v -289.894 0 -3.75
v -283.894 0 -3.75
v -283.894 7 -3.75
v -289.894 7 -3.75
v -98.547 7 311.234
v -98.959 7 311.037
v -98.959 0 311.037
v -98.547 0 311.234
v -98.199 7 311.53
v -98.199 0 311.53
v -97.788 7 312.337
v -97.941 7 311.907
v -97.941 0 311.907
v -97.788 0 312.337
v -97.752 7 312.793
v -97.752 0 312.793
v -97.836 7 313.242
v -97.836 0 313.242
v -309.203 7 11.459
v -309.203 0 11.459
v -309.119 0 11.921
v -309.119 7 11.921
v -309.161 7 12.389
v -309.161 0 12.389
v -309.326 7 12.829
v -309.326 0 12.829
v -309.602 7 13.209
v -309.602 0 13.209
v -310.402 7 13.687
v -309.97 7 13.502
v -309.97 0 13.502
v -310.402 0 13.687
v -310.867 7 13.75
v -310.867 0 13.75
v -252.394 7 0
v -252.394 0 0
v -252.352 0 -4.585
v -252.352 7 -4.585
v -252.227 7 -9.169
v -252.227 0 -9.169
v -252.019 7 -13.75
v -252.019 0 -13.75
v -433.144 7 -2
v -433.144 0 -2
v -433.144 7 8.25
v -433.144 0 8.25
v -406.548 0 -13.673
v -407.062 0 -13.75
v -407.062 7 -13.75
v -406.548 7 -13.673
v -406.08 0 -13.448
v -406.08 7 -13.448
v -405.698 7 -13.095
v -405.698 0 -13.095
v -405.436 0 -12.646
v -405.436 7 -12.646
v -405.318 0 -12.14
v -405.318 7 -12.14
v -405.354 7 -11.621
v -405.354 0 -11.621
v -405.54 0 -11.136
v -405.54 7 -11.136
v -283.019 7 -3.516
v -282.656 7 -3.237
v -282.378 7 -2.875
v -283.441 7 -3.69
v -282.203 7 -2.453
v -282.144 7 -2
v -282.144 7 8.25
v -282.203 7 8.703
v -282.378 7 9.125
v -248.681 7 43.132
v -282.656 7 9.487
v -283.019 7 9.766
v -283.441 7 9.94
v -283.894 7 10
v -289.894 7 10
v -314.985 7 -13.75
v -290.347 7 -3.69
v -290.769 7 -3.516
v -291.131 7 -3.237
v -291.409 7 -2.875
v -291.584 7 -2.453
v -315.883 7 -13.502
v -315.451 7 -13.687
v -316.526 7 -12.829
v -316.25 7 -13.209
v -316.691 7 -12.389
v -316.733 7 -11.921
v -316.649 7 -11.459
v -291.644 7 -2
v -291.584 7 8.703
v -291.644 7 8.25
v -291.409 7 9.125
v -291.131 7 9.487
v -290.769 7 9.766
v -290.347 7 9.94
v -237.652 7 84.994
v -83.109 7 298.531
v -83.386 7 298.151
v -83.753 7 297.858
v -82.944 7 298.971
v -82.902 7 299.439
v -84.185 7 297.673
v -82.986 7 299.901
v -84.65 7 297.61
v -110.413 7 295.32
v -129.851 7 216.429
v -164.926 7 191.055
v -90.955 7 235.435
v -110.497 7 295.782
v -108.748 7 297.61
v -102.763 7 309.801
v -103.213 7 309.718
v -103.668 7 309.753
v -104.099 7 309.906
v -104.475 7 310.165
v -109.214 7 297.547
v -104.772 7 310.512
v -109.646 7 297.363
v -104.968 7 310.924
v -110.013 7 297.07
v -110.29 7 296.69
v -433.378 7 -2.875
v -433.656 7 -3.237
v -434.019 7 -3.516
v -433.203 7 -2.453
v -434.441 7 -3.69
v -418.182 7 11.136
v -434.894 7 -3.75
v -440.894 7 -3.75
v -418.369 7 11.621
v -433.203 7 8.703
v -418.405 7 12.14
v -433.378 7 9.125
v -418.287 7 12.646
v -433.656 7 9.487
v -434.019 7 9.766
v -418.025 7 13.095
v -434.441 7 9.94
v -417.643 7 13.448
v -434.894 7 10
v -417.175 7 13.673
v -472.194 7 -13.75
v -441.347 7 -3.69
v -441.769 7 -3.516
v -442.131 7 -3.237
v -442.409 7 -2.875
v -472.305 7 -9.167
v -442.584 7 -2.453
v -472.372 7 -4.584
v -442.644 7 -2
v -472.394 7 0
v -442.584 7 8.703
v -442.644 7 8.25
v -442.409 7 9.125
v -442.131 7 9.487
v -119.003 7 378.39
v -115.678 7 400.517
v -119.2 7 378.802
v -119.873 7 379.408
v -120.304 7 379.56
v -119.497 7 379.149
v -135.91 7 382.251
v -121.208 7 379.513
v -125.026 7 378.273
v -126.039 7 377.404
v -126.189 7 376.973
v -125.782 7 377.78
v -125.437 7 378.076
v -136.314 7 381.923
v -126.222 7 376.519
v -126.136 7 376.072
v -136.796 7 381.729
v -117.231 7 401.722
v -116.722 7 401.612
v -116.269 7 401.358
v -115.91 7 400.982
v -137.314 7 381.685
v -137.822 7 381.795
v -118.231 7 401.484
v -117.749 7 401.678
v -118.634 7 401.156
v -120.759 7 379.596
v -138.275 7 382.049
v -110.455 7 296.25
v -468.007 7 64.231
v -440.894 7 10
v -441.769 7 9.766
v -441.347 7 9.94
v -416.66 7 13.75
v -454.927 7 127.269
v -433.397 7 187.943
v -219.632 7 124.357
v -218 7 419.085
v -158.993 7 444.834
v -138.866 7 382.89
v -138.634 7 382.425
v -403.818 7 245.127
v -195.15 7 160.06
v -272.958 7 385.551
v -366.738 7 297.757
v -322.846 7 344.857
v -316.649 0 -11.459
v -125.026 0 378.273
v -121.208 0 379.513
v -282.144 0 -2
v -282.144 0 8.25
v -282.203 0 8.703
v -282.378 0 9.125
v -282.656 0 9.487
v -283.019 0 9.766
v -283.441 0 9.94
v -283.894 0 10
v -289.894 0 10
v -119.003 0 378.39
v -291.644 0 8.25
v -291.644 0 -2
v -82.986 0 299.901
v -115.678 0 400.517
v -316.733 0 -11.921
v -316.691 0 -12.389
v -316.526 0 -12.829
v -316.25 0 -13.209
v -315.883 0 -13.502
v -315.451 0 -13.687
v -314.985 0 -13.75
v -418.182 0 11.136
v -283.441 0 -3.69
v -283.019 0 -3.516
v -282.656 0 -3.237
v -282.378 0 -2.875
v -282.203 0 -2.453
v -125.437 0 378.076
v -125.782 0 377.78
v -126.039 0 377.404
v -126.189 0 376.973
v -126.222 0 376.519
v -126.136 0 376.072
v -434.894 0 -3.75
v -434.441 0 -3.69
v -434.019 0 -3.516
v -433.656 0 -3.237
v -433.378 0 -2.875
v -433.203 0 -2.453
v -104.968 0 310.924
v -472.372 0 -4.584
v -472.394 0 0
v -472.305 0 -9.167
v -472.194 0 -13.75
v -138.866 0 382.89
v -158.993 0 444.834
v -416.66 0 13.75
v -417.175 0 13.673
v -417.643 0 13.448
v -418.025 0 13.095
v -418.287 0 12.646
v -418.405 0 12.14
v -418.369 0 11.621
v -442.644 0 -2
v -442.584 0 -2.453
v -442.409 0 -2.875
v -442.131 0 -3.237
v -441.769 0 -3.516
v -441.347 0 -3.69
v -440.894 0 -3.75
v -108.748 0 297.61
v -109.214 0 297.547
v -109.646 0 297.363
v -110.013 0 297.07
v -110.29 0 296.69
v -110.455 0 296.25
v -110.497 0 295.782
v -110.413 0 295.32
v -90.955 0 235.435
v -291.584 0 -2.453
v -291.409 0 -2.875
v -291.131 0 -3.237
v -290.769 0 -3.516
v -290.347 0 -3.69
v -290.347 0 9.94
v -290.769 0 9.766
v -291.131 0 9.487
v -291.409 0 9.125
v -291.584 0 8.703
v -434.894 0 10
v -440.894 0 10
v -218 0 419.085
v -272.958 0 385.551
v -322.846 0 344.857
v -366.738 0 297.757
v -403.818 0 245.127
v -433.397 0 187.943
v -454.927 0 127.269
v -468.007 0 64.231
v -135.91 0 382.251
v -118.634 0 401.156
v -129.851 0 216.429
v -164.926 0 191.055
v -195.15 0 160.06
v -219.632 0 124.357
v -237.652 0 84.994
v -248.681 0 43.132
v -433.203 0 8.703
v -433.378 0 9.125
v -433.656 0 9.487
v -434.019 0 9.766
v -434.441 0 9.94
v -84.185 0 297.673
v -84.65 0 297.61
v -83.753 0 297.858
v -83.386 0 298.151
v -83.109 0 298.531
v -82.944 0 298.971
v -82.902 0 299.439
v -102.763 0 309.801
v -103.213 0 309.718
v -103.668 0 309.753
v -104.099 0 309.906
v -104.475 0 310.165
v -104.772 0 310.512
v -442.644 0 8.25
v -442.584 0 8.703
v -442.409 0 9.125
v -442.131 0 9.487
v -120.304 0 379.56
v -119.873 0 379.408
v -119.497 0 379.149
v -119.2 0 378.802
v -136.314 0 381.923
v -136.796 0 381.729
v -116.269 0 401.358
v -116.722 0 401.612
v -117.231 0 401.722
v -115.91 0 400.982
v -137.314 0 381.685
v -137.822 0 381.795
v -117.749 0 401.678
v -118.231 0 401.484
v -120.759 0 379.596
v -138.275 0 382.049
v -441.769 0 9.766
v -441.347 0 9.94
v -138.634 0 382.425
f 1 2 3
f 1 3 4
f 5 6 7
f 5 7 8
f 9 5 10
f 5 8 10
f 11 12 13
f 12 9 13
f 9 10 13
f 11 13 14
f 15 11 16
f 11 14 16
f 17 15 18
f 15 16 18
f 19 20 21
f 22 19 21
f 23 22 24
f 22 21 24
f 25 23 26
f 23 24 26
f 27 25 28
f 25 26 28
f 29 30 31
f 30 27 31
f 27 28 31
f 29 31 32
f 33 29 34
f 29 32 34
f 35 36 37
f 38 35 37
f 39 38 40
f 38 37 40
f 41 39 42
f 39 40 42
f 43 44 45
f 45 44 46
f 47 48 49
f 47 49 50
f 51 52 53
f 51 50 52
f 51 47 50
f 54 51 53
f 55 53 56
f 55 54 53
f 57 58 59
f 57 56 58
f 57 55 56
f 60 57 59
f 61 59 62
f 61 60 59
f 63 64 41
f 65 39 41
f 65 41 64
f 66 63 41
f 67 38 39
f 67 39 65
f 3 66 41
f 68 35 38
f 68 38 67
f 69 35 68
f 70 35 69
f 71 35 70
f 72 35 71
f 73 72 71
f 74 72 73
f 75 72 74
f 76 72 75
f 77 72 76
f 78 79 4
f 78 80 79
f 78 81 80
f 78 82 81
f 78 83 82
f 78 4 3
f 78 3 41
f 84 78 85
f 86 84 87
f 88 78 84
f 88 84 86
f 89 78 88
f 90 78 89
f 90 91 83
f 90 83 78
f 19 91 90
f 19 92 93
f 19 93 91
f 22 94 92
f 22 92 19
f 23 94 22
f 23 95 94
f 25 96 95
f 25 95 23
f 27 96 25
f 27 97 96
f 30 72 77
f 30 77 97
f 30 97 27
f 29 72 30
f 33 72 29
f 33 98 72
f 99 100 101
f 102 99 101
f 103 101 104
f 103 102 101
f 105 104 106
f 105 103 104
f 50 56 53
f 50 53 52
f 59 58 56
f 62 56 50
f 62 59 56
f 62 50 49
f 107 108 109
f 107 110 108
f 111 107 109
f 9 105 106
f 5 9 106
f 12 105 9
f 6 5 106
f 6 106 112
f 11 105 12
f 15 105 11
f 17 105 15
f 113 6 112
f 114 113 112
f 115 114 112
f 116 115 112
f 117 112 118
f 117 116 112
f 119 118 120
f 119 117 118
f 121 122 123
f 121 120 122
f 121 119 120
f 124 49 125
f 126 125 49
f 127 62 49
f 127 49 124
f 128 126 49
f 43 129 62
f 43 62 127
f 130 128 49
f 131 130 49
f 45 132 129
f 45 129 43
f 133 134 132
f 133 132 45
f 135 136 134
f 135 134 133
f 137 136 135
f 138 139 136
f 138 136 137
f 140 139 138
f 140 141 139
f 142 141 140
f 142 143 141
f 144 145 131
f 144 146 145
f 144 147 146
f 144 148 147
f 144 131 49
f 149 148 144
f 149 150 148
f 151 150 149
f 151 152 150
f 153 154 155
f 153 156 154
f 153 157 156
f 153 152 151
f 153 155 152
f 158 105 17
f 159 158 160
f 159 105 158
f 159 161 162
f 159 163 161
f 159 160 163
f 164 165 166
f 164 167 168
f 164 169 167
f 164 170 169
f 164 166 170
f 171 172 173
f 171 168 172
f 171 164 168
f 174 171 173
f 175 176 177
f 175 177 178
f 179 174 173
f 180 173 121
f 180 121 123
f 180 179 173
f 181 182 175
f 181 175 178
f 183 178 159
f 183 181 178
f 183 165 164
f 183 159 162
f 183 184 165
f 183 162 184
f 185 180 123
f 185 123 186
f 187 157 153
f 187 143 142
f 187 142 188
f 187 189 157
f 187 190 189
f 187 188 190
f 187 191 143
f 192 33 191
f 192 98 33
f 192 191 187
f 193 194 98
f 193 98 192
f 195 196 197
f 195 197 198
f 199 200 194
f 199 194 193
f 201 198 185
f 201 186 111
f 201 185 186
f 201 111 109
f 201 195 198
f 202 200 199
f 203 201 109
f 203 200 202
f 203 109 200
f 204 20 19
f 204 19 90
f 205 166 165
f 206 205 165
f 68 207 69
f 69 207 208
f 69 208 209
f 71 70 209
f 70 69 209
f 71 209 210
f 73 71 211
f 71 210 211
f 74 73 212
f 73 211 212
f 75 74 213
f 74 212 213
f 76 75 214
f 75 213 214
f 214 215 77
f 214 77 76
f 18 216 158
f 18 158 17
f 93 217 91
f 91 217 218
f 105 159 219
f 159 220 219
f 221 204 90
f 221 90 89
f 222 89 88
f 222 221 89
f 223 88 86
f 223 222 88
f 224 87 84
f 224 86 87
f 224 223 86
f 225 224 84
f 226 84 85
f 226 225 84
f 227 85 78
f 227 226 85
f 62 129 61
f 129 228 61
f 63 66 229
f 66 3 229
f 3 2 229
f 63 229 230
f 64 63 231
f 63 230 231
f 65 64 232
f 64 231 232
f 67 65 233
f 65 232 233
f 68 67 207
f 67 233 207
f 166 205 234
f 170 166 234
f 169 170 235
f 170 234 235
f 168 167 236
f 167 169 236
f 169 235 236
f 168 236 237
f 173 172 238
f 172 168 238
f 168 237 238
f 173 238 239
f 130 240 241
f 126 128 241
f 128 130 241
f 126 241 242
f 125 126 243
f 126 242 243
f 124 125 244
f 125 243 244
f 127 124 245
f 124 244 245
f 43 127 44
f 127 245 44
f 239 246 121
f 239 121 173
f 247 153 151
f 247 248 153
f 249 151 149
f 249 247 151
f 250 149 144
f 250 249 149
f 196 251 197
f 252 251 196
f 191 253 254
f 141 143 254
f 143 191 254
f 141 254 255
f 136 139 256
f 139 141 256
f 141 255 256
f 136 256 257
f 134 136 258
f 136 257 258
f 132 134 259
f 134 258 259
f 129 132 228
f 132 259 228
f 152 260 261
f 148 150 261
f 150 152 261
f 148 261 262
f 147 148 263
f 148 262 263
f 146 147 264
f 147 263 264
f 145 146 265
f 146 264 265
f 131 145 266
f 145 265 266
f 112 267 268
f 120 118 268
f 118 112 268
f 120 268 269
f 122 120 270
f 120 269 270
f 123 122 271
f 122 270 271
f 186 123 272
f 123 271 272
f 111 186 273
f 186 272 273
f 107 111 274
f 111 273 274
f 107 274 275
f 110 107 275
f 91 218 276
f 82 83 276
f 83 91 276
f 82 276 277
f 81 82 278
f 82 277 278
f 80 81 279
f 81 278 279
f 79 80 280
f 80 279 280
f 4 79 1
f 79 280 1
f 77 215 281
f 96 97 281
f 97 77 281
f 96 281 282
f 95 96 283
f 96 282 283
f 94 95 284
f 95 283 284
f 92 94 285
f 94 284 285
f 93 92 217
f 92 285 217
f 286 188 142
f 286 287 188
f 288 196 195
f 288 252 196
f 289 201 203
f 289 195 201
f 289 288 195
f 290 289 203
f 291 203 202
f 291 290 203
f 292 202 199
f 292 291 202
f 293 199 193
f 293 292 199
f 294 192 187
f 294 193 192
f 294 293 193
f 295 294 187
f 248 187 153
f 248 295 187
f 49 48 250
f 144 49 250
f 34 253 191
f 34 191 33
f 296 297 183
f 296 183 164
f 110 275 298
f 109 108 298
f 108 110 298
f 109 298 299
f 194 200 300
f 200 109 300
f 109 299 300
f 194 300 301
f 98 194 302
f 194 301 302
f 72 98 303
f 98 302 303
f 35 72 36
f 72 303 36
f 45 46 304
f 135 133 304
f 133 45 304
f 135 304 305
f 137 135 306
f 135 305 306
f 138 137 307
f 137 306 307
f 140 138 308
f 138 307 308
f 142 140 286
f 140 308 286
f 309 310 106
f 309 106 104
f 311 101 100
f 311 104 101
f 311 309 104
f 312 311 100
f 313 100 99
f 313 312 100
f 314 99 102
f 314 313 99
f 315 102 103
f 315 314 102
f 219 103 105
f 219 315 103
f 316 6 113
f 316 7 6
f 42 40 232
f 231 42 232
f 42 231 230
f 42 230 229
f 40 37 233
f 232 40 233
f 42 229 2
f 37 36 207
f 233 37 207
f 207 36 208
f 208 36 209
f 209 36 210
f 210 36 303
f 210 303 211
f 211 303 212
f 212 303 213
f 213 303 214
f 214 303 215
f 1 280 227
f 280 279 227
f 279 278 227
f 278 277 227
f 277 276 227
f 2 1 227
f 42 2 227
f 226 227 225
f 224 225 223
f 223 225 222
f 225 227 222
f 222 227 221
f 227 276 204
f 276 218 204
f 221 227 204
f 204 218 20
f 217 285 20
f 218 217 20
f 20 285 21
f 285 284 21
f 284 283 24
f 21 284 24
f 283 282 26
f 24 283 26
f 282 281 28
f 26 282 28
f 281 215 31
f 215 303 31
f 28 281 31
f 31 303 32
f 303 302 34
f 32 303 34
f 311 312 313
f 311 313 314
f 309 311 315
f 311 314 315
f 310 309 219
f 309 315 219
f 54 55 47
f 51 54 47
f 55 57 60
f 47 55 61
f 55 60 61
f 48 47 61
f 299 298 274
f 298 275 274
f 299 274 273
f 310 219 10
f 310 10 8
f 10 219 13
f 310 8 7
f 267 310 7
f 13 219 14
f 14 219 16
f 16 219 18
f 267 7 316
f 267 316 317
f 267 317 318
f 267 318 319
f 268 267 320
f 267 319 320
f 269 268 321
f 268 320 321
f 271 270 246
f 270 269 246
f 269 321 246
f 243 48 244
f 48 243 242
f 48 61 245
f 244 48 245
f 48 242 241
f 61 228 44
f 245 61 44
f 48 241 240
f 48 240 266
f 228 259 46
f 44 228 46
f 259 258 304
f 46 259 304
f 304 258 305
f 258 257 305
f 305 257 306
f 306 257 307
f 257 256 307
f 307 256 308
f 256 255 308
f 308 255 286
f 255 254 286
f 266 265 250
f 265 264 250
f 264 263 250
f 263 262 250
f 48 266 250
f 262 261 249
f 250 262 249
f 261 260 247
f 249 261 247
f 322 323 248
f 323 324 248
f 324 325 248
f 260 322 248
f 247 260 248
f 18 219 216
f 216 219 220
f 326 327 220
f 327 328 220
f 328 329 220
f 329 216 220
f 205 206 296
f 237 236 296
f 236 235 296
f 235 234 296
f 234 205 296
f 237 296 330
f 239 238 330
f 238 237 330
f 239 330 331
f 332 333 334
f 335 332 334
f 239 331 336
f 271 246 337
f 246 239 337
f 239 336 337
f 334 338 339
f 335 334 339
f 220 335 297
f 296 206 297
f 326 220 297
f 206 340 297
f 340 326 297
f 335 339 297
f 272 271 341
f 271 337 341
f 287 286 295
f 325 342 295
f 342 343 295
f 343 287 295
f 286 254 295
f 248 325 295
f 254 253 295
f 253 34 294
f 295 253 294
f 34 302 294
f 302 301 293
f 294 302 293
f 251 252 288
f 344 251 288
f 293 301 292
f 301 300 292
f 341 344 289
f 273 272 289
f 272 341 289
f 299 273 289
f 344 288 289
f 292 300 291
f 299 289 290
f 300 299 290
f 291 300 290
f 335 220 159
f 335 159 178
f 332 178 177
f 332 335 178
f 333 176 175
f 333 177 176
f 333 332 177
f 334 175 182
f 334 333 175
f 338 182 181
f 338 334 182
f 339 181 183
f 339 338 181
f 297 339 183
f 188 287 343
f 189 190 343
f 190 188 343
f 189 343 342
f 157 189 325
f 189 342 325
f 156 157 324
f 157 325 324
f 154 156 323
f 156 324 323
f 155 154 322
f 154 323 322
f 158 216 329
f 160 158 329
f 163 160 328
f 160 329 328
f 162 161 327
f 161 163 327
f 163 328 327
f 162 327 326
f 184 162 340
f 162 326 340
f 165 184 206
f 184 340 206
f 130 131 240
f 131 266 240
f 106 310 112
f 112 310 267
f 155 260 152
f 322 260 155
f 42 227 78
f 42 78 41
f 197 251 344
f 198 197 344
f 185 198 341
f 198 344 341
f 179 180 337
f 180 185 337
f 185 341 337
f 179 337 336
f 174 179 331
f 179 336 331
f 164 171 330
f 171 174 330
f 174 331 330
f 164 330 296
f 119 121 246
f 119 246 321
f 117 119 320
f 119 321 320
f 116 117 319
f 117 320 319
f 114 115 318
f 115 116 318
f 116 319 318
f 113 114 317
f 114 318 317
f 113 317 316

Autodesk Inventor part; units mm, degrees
ref_plane "YZ Plane" through (0, 0, 0) normal (1, 0, 0) x (0, 1, 0)
ref_plane "XZ Plane" through (0, 0, 0) normal (0, 1, 0) x (-1, 0, 0)
ref_plane "XY Plane" through (0, 0, 0) normal (0, 0, 1) x (1, 0, 0)
sketch "Sketch1" plane through (0, 0, 0) normal (0, 1, 0) x (-1, 0, 0)
  line L0 (0, 0) -> (618.9442, 0)
  line L1 (0, 0) -> (191.2643, 588.6509)
  line L2 (0, 0) -> (-500.7364, 363.8063)
  line L3 (0, 0) -> (-500.7364, -363.8063)
  line L4 (0, 0) -> (191.2643, -588.6509)
  line L5 (396.6438, 3.75) -> (328.1438, 3.75)
  line L6 (328.1438, -3.75) -> (396.6438, -3.75)
  arc A0 (472.3938, 0) -> (145.9777, 449.2732) centre (0, 0) ccw
  arc A1 (77.994, -240.0408) -> (252.3938, 0) centre (0, 0) ccw
  line L7 (289.8938, 3.75) -> (283.8938, 3.75)
  line L8 (283.8938, -3.75) -> (289.8938, -3.75)
  arc A2 (328.1438, 3.75) -> (326.3938, 2) centre (328.1438, 2) ccw
  arc A3 (326.3938, -2) -> (328.1438, -3.75) centre (328.1438, -2) ccw
  line L9 (326.3938, 2) -> (326.3938, -2)
  arc A4 (398.3938, 2) -> (396.6438, 3.75) centre (396.6438, 2) ccw
  arc A5 (396.6438, -3.75) -> (398.3938, -2.0136) centre (396.6573, -2.0136) ccw
  line L10 (398.3938, -2.0136) -> (398.3938, 2)
  line L11 (362.3938, -3.75) -> (362.3938, 32.9806)
  arc A6 (283.8938, 3.75) -> (282.1438, 2) centre (283.8938, 2) ccw
  arc A7 (282.1438, -2) -> (283.8938, -3.75) centre (283.8938, -2) ccw
  arc A8 (289.8938, -3.75) -> (291.6438, -2) centre (289.8938, -2) ccw
  arc A9 (291.6438, 2) -> (289.8938, 3.75) centre (289.8938, 2) ccw
  line L12 (291.6438, 2) -> (291.6438, -2)
  line L13 (282.1438, -2) -> (282.1438, 2)
  line L14 (434.8938, 3.75) -> (440.8938, 3.75)
  line L15 (440.8938, -3.75) -> (434.8938, -3.75)
  arc A10 (442.6438, 2) -> (440.8938, 3.75) centre (440.8938, 2) ccw
  arc A11 (440.8938, -3.75) -> (442.6438, -2) centre (440.8938, -2) ccw
  arc A12 (433.1438, -2) -> (434.8938, -3.75) centre (434.8938, -2) ccw
  arc A13 (434.8938, 3.75) -> (433.1438, 2) centre (434.8938, 2) ccw
  line L16 (433.1438, 2) -> (433.1438, -2)
  line L17 (442.6438, -2) -> (442.6438, 2)
  line L18 (131.9467, 412.5623) -> (135.7509, 411.3262)
  arc A14 (130.8231, 414.7674) -> (131.9467, 412.5623) centre (132.4875, 414.2266) ccw
  arc A15 (135.7509, 411.3262) -> (137.956, 412.4498) centre (136.2917, 412.9905) ccw
  line L19 (139.8101, 418.1561) -> (137.956, 412.4498)
  line L20 (130.8231, 414.7674) -> (132.6772, 420.4737)
  arc A16 (134.8823, 421.5973) -> (132.6772, 420.4737) centre (134.3416, 419.9329) ccw
  line L21 (138.6866, 420.3612) -> (134.8823, 421.5973)
  arc A17 (139.8101, 418.1561) -> (138.6866, 420.3612) centre (138.1458, 418.6969) ccw
  line L22 (125.0255, 378.2728) -> (121.2083, 379.513)
  arc A18 (121.2083, 379.513) -> (119.0032, 378.3895) centre (120.6676, 377.8487) ccw
  arc A19 (126.1361, 376.0718) -> (125.0255, 378.2728) centre (124.4888, 376.6213) ccw
  line L23 (119.0032, 378.3895) -> (97.8355, 313.2421)
  line L24 (98.9591, 311.037) -> (102.7633, 309.8009)
  arc A20 (97.8355, 313.2421) -> (98.9591, 311.037) centre (99.4999, 312.7013) ccw
  arc A21 (102.7633, 309.8009) -> (104.9685, 310.9245) centre (103.3041, 311.4652) ccw
  line L25 (104.9685, 310.9245) -> (126.1361, 376.0718)
  line L26 (88.2208, 277.9878) -> (92.025, 276.7517)
  arc A22 (93.1486, 274.5466) -> (92.025, 276.7517) centre (91.4842, 275.0873) ccw
  line L27 (91.2945, 268.8402) -> (93.1486, 274.5466)
  arc A23 (88.2208, 277.9878) -> (86.0156, 276.8642) centre (87.68, 276.3234) ccw
  line L28 (86.0156, 276.8642) -> (84.1615, 271.1578)
  arc A24 (84.1615, 271.1578) -> (85.2851, 268.9527) centre (85.8259, 270.6171) ccw
  arc A25 (89.0893, 267.7166) -> (91.2945, 268.8402) centre (89.6301, 269.381) ccw
  line L29 (89.0893, 267.7166) -> (85.2851, 268.9527)
  line L30 (-351.5963, 252.9775) -> (-349.2451, 256.2136)
  arc A26 (-354.0407, 252.5903) -> (-351.5963, 252.9775) centre (-353.012, 254.0061) ccw
  arc A27 (-349.2451, 256.2136) -> (-349.6323, 258.658) centre (-350.6609, 257.2422) ccw
  line L31 (-354.4864, 262.1847) -> (-349.6323, 258.658)
  line L32 (-354.0407, 252.5903) -> (-358.8948, 256.1171)
  arc A28 (-359.2819, 258.5615) -> (-358.8948, 256.1171) centre (-357.8661, 257.5328) ccw
  line L33 (-356.9308, 261.7975) -> (-359.2819, 258.5615)
  arc A29 (-354.4864, 262.1847) -> (-356.9308, 261.7975) centre (-355.515, 260.7689) ccw
  line L34 (-321.1238, 235.799) -> (-323.4829, 232.552)
  arc A30 (-323.4829, 232.552) -> (-323.0958, 230.1076) centre (-322.0671, 231.5233) ccw
  arc A31 (-318.6874, 236.1752) -> (-321.1238, 235.799) centre (-319.7189, 234.7783) ccw
  line L35 (-323.0958, 230.1076) -> (-267.6781, 189.8443)
  line L36 (-265.2337, 190.2314) -> (-262.8825, 193.4675)
  arc A32 (-267.6781, 189.8443) -> (-265.2337, 190.2314) centre (-266.6495, 191.26) ccw
  arc A33 (-262.8825, 193.4675) -> (-263.2697, 195.9119) centre (-264.2983, 194.4961) ccw
  line L37 (-263.2697, 195.9119) -> (-318.6874, 236.1752)
  line L38 (-237.1203, 169.8059) -> (-234.7692, 173.0419)
  arc A34 (-232.3248, 173.4291) -> (-234.7692, 173.0419) centre (-233.3534, 172.0133) ccw
  line L39 (-227.4707, 169.9024) -> (-232.3248, 173.4291)
  arc A35 (-237.1203, 169.8059) -> (-236.7332, 167.3615) centre (-235.7046, 168.7773) ccw
  line L40 (-236.7332, 167.3615) -> (-231.8791, 163.8348)
  arc A36 (-231.8791, 163.8348) -> (-229.4347, 164.2219) centre (-230.8505, 165.2505) ccw
  arc A37 (-227.0835, 167.458) -> (-227.4707, 169.9024) centre (-228.4993, 168.4866) ccw
  line L41 (-227.0835, 167.458) -> (-229.4347, 164.2219)
  line L42 (-349.2451, -256.2136) -> (-351.5963, -252.9775)
  arc A38 (-349.6323, -258.658) -> (-349.2451, -256.2136) centre (-350.6609, -257.2422) ccw
  arc A39 (-351.5963, -252.9775) -> (-354.0407, -252.5903) centre (-353.012, -254.0061) ccw
  line L43 (-358.8948, -256.117) -> (-354.0407, -252.5903)
  line L44 (-349.6323, -258.658) -> (-354.4864, -262.1847)
  arc A40 (-356.9308, -261.7975) -> (-354.4864, -262.1847) centre (-355.515, -260.7689) ccw
  line L45 (-359.2819, -258.5615) -> (-356.9308, -261.7975)
  arc A41 (-358.8948, -256.117) -> (-359.2819, -258.5615) centre (-357.8661, -257.5328) ccw
  line L46 (-323.4909, -232.541) -> (-321.1318, -235.788)
  arc A42 (-321.1318, -235.788) -> (-318.6874, -236.1752) centre (-319.716, -234.7594) ccw
  arc A43 (-323.0958, -230.1076) -> (-323.4909, -232.541) centre (-322.086, -231.5203) ccw
  line L47 (-318.6874, -236.1752) -> (-263.2697, -195.9119)
  line L48 (-262.8825, -193.4675) -> (-265.2337, -190.2314)
  arc A44 (-263.2697, -195.9119) -> (-262.8825, -193.4675) centre (-264.2983, -194.4961) ccw
  arc A45 (-265.2337, -190.2314) -> (-267.6781, -189.8443) centre (-266.6495, -191.26) ccw
  line L49 (-267.6781, -189.8443) -> (-323.0958, -230.1076)
  line L50 (-234.7692, -173.0419) -> (-237.1203, -169.8059)
  arc A46 (-236.7332, -167.3615) -> (-237.1203, -169.8059) centre (-235.7046, -168.7773) ccw
  line L51 (-231.8791, -163.8348) -> (-236.7332, -167.3615)
  arc A47 (-234.7692, -173.0419) -> (-232.3248, -173.4291) centre (-233.3534, -172.0133) ccw
  line L52 (-232.3248, -173.4291) -> (-227.4707, -169.9024)
  arc A48 (-227.4707, -169.9024) -> (-227.0835, -167.458) centre (-228.4993, -168.4866) ccw
  arc A49 (-229.4347, -164.2219) -> (-231.8791, -163.8348) centre (-230.8505, -165.2505) ccw
  line L53 (-229.4347, -164.2219) -> (-227.0835, -167.458)
  line L54 (135.7509, -411.3262) -> (131.9467, -412.5623)
  arc A50 (137.956, -412.4498) -> (135.7509, -411.3262) centre (136.2917, -412.9905) ccw
  arc A51 (131.9467, -412.5623) -> (130.8231, -414.7674) centre (132.4875, -414.2266) ccw
  line L55 (132.6772, -420.4737) -> (130.8231, -414.7674)
  line L56 (137.956, -412.4498) -> (139.8101, -418.1561)
  arc A52 (138.6866, -420.3612) -> (139.8101, -418.1561) centre (138.1458, -418.6969) ccw
  line L57 (134.8823, -421.5973) -> (138.6866, -420.3612)
  arc A53 (132.6772, -420.4737) -> (134.8823, -421.5973) centre (134.3416, -419.9329) ccw
  line L58 (121.1954, -379.5172) -> (125.0126, -378.277)
  arc A54 (125.0126, -378.277) -> (126.1361, -376.0718) centre (124.4718, -376.6126) ccw
  arc A55 (119.0032, -378.3895) -> (121.1954, -379.5172) centre (120.6588, -377.8657) ccw
  line L59 (126.1361, -376.0718) -> (104.9685, -310.9245)
  line L60 (102.7633, -309.8009) -> (98.9591, -311.037)
  arc A56 (104.9685, -310.9245) -> (102.7633, -309.8009) centre (103.3041, -311.4652) ccw
  arc A57 (98.9591, -311.037) -> (97.8355, -313.2421) centre (99.4999, -312.7013) ccw
  line L61 (97.8355, -313.2421) -> (119.0032, -378.3895)
  line L62 (92.025, -276.7517) -> (88.2208, -277.9878)
  arc A58 (86.0156, -276.8642) -> (88.2208, -277.9878) centre (87.68, -276.3234) ccw
  line L63 (84.1615, -271.1578) -> (86.0156, -276.8642)
  arc A59 (92.025, -276.7517) -> (93.1486, -274.5466) centre (91.4842, -275.0873) ccw
  line L64 (93.1486, -274.5466) -> (91.2945, -268.8402)
  arc A60 (91.2945, -268.8402) -> (89.0893, -267.7166) centre (89.6301, -269.381) ccw
  arc A61 (85.2851, -268.9527) -> (84.1615, -271.1578) centre (85.8259, -270.6171) ccw
  line L65 (85.2851, -268.9527) -> (89.0893, -267.7166)
  line L66 (-442.5303, 165.2961) -> (-220.837, 122.2033)
  line L67 (-442.5303, -165.2961) -> (-220.837, -122.2033)
  arc A62 (252.3938, 0) -> (-220.837, 122.2033) centre (0, 0) ccw
  arc A63 (-220.837, -122.2033) -> (77.994, -240.0408) centre (0, 0) ccw
  arc A64 (145.9777, 449.2732) -> (-442.5303, 165.2961) centre (0, 0) ccw
  arc A65 (-442.5303, -165.2961) -> (472.3938, 0) centre (0, 0) ccw
  line L68 (115.6782, 400.5167) -> (82.9862, 299.9012)
  line L69 (84.6505, 297.6104) -> (108.7484, 297.6104)
  line L70 (110.4128, 295.3196) -> (90.9552, 235.4353)
  line L71 (138.8662, 382.8904) -> (158.9929, 444.8338)
  line L72 (118.6344, 401.1564) -> (135.91, 382.2507)
  line L73 (123.1169, 378.8929) -> (127.2722, 391.7035) construction
  line L74 (100.8612, 310.4189) -> (96.6995, 297.6104) construction
  arc A66 (135.91, 382.2507) -> (138.8662, 382.8904) centre (137.2019, 383.4311) ccw
  arc A67 (118.6344, 401.1564) -> (115.6782, 400.5167) centre (117.3425, 399.9759) ccw
  arc A68 (82.9862, 299.9012) -> (84.6505, 297.6104) centre (84.6505, 299.3604) ccw
  arc A69 (110.4128, 295.3196) -> (108.7484, 297.6104) centre (108.7484, 295.8604) ccw
  line L75 (407.0624, -13.75) -> (472.1936, -13.75)
  arc A70 (405.5405, -11.1361) -> (407.0624, -13.75) centre (407.0624, -12) ccw
  line L76 (418.1824, 11.1361) -> (405.5405, -11.1361)
  arc A71 (418.1824, 11.1361) -> (416.6605, 13.75) centre (416.6605, 12) ccw
  line L77 (416.6605, 13.75) -> (310.8671, 13.75)
  line L78 (309.2028, 11.4592) -> (316.6494, -11.4592)
  arc A72 (310.8671, 13.75) -> (309.2028, 11.4592) centre (310.8671, 12) ccw
  arc A73 (314.9851, -13.75) -> (316.6494, -11.4592) centre (314.9851, -12) ccw
  line L79 (314.9851, -13.75) -> (252.019, -13.75)
  line L80 (112.7122, -391.3883) -> (132.8388, -453.3318)
  arc A74 (114.7278, -389.1332) -> (112.7122, -391.3883) centre (114.3765, -390.8476) ccw
  line L81 (139.8166, -394.2739) -> (114.7278, -389.1332)
  arc A75 (139.8166, -394.2739) -> (141.8322, -392.0187) centre (140.1679, -392.5595) ccw
  line L82 (141.8322, -392.0187) -> (109.1403, -291.4032)
  line L83 (106.4473, -290.5282) -> (86.9517, -304.6926)
  arc A76 (109.1403, -291.4032) -> (106.4473, -290.5282) centre (107.4759, -291.944) ccw
  arc A77 (84.2587, -303.8176) -> (86.9517, -304.6926) centre (85.9231, -303.2768) ccw
  line L84 (84.2587, -303.8176) -> (64.8011, -243.9333)
  line L85 (-359.2819, 258.5615) -> (-362.9556, 253.5051)
  line L86 (-362.5684, 251.0607) -> (-357.7143, 247.534)
  line L87 (-351.5963, 252.9775) -> (-355.2699, 247.9211)
  arc A78 (-362.9556, 253.5051) -> (-362.5684, 251.0607) centre (-361.5398, 252.4765) ccw
  arc A79 (-357.7143, 247.534) -> (-355.2699, 247.9211) centre (-356.6857, 248.9498) ccw
  line L88 (-237.1203, 169.8059) -> (-240.794, 164.7495)
  line L89 (-240.4068, 162.3051) -> (-235.5527, 158.7784)
  line L90 (-229.4347, 164.2219) -> (-233.1083, 159.1656)
  arc A80 (-240.794, 164.7495) -> (-240.4068, 162.3051) centre (-239.3782, 163.7209) ccw
  arc A81 (-235.5527, 158.7784) -> (-233.1083, 159.1656) centre (-234.5241, 160.1942) ccw
  line L91 (-356.9308, -261.7975) -> (-353.2571, -266.8539)
  arc A82 (-353.2571, -266.8539) -> (-350.8127, -267.241) centre (-351.8413, -265.8253) ccw
  line L92 (-350.8127, -267.241) -> (-345.9586, -263.7143)
  arc A83 (-345.9586, -263.7143) -> (-345.5715, -261.2699) centre (-346.9872, -262.2985) ccw
  line L93 (-349.2451, -256.2136) -> (-345.5715, -261.2699)
  line L94 (-234.7692, -173.0419) -> (-231.0955, -178.0983)
  arc A84 (-231.0955, -178.0983) -> (-228.6511, -178.4855) centre (-229.6798, -177.0697) ccw
  line L95 (-228.6511, -178.4855) -> (-223.797, -174.9587)
  arc A85 (-223.797, -174.9587) -> (-223.4099, -172.5143) centre (-224.8257, -173.543) ccw
  line L96 (-227.0835, -167.458) -> (-223.4099, -172.5143)
  line L97 (138.6866, -420.3612) -> (144.6307, -418.4299)
  arc A86 (144.6307, -418.4299) -> (145.7542, -416.2247) centre (144.0899, -416.7655) ccw
  line L98 (145.7542, -416.2247) -> (143.9001, -410.5184)
  arc A87 (143.9001, -410.5184) -> (141.695, -409.3948) centre (142.2358, -411.0592) ccw
  line L99 (135.7509, -411.3262) -> (141.695, -409.3948)
  line L100 (92.025, -276.7517) -> (97.9691, -274.8203)
  arc A88 (97.9691, -274.8203) -> (99.0927, -272.6152) centre (97.4283, -273.156) ccw
  line L101 (99.0927, -272.6152) -> (97.2386, -266.9089)
  arc A89 (97.2386, -266.9089) -> (95.0334, -265.7853) centre (95.5742, -267.4496) ccw
  line L102 (89.0893, -267.7166) -> (95.0334, -265.7853)
  line L103 (442.6438, 2) -> (442.6438, 8.25)
  arc A90 (442.6438, 8.25) -> (440.8938, 10) centre (440.8938, 8.25) ccw
  line L104 (440.8938, 10) -> (434.8938, 10)
  arc A91 (434.8938, 10) -> (433.1438, 8.25) centre (434.8938, 8.25) ccw
  line L105 (433.1438, 2) -> (433.1438, 8.25)
  line L106 (291.6438, 2) -> (291.6438, 8.25)
  arc A92 (291.6438, 8.25) -> (289.8938, 10) centre (289.8938, 8.25) ccw
  line L107 (289.8938, 10) -> (283.8938, 10)
  arc A93 (283.8938, 10) -> (282.1438, 8.25) centre (283.8938, 8.25) ccw
  line L108 (282.1438, 2) -> (282.1438, 8.25)
  line L109 (134.8823, 421.5973) -> (128.9382, 423.5286)
  arc A94 (128.9382, 423.5286) -> (126.7331, 422.4051) centre (128.3975, 421.8643) ccw
  line L110 (126.7331, 422.4051) -> (124.879, 416.6987)
  arc A95 (124.879, 416.6987) -> (126.0026, 414.4936) centre (126.5434, 416.158) ccw
  line L111 (131.9467, 412.5623) -> (126.0026, 414.4936)
  line L112 (88.2208, 277.9878) -> (82.2767, 279.9191)
  arc A96 (82.2767, 279.9191) -> (80.0715, 278.7955) centre (81.7359, 278.2548) ccw
  line L113 (80.0715, 278.7955) -> (78.2174, 273.0892)
  arc A97 (78.2174, 273.0892) -> (79.341, 270.8841) centre (79.8818, 272.5484) ccw
  line L114 (85.2851, 268.9527) -> (79.341, 270.8841)
  point P0 (115.5523, 343.4982)
  point P1 (-290.9785, 216.0435)
  point P2 (-295.3869, -209.9759)
  point P3 (108.4194, -345.8158)
  point P4 (137.9375, 380.0319)
  point P5 (97.9406, 311.9068)
  point P6 (104.0986, 309.906)
  point P7 (119.8731, 379.408)
  point P8 (404.0568, -13.75)
  point P9 (411.8615, 0)
  point P10 (312.9261, 0)
  point P11 (111.7834, -388.5299)
  point P12 (127.2722, -391.7035)
  point P13 (96.6995, -297.6104)
  point P14 (282.1438, 2)
  point P15 (442.6438, 2)
  dimension "d4" = 360
  dimension "d6" = 7.5
  dimension "d7" = 7.5
  dimension "d9" = 68.5
  dimension "d10" = 7.5
  dimension "d11" = 7.5
  dimension "d12" = 3.5
  dimension "d13" = 3.5
  dimension "d19" = 360
  dimension "d21" = 25
  dimension "d25" = 10
  dimension "d26" = 10
  dimension "d27" = 1.75
  dimension "d30" = 144
  dimension "d34" = 0
  dimension "d35" = 8
  dimension "d36" = 1.75
  dimension "d43" = 8
  dimension "d44" = 1.75
  dimension "d47" = 360
extrude "Extrusion1" add sketch "Sketch1" along normal blind 7 contours A62 L70 A69 L69 L1 L24 A21 L25 A19 L22 L72 A66 L71 A0 L0 L17 L103 A90 L104 A91 L105 L16 L76 A71 L77 A72 L78 L12 L106 A92 L107 A93 L108 L13 | L0 L13 A7 L8 A8 L12 L78 A73 L79 A1 | L69 A68 L68 A67 L72 L1 L22 A18 L23 A20 L24 | A65 L75 A70 L76 L0 L16 A12 L15 A11 L17
properties part number "Level 3c - V2"
